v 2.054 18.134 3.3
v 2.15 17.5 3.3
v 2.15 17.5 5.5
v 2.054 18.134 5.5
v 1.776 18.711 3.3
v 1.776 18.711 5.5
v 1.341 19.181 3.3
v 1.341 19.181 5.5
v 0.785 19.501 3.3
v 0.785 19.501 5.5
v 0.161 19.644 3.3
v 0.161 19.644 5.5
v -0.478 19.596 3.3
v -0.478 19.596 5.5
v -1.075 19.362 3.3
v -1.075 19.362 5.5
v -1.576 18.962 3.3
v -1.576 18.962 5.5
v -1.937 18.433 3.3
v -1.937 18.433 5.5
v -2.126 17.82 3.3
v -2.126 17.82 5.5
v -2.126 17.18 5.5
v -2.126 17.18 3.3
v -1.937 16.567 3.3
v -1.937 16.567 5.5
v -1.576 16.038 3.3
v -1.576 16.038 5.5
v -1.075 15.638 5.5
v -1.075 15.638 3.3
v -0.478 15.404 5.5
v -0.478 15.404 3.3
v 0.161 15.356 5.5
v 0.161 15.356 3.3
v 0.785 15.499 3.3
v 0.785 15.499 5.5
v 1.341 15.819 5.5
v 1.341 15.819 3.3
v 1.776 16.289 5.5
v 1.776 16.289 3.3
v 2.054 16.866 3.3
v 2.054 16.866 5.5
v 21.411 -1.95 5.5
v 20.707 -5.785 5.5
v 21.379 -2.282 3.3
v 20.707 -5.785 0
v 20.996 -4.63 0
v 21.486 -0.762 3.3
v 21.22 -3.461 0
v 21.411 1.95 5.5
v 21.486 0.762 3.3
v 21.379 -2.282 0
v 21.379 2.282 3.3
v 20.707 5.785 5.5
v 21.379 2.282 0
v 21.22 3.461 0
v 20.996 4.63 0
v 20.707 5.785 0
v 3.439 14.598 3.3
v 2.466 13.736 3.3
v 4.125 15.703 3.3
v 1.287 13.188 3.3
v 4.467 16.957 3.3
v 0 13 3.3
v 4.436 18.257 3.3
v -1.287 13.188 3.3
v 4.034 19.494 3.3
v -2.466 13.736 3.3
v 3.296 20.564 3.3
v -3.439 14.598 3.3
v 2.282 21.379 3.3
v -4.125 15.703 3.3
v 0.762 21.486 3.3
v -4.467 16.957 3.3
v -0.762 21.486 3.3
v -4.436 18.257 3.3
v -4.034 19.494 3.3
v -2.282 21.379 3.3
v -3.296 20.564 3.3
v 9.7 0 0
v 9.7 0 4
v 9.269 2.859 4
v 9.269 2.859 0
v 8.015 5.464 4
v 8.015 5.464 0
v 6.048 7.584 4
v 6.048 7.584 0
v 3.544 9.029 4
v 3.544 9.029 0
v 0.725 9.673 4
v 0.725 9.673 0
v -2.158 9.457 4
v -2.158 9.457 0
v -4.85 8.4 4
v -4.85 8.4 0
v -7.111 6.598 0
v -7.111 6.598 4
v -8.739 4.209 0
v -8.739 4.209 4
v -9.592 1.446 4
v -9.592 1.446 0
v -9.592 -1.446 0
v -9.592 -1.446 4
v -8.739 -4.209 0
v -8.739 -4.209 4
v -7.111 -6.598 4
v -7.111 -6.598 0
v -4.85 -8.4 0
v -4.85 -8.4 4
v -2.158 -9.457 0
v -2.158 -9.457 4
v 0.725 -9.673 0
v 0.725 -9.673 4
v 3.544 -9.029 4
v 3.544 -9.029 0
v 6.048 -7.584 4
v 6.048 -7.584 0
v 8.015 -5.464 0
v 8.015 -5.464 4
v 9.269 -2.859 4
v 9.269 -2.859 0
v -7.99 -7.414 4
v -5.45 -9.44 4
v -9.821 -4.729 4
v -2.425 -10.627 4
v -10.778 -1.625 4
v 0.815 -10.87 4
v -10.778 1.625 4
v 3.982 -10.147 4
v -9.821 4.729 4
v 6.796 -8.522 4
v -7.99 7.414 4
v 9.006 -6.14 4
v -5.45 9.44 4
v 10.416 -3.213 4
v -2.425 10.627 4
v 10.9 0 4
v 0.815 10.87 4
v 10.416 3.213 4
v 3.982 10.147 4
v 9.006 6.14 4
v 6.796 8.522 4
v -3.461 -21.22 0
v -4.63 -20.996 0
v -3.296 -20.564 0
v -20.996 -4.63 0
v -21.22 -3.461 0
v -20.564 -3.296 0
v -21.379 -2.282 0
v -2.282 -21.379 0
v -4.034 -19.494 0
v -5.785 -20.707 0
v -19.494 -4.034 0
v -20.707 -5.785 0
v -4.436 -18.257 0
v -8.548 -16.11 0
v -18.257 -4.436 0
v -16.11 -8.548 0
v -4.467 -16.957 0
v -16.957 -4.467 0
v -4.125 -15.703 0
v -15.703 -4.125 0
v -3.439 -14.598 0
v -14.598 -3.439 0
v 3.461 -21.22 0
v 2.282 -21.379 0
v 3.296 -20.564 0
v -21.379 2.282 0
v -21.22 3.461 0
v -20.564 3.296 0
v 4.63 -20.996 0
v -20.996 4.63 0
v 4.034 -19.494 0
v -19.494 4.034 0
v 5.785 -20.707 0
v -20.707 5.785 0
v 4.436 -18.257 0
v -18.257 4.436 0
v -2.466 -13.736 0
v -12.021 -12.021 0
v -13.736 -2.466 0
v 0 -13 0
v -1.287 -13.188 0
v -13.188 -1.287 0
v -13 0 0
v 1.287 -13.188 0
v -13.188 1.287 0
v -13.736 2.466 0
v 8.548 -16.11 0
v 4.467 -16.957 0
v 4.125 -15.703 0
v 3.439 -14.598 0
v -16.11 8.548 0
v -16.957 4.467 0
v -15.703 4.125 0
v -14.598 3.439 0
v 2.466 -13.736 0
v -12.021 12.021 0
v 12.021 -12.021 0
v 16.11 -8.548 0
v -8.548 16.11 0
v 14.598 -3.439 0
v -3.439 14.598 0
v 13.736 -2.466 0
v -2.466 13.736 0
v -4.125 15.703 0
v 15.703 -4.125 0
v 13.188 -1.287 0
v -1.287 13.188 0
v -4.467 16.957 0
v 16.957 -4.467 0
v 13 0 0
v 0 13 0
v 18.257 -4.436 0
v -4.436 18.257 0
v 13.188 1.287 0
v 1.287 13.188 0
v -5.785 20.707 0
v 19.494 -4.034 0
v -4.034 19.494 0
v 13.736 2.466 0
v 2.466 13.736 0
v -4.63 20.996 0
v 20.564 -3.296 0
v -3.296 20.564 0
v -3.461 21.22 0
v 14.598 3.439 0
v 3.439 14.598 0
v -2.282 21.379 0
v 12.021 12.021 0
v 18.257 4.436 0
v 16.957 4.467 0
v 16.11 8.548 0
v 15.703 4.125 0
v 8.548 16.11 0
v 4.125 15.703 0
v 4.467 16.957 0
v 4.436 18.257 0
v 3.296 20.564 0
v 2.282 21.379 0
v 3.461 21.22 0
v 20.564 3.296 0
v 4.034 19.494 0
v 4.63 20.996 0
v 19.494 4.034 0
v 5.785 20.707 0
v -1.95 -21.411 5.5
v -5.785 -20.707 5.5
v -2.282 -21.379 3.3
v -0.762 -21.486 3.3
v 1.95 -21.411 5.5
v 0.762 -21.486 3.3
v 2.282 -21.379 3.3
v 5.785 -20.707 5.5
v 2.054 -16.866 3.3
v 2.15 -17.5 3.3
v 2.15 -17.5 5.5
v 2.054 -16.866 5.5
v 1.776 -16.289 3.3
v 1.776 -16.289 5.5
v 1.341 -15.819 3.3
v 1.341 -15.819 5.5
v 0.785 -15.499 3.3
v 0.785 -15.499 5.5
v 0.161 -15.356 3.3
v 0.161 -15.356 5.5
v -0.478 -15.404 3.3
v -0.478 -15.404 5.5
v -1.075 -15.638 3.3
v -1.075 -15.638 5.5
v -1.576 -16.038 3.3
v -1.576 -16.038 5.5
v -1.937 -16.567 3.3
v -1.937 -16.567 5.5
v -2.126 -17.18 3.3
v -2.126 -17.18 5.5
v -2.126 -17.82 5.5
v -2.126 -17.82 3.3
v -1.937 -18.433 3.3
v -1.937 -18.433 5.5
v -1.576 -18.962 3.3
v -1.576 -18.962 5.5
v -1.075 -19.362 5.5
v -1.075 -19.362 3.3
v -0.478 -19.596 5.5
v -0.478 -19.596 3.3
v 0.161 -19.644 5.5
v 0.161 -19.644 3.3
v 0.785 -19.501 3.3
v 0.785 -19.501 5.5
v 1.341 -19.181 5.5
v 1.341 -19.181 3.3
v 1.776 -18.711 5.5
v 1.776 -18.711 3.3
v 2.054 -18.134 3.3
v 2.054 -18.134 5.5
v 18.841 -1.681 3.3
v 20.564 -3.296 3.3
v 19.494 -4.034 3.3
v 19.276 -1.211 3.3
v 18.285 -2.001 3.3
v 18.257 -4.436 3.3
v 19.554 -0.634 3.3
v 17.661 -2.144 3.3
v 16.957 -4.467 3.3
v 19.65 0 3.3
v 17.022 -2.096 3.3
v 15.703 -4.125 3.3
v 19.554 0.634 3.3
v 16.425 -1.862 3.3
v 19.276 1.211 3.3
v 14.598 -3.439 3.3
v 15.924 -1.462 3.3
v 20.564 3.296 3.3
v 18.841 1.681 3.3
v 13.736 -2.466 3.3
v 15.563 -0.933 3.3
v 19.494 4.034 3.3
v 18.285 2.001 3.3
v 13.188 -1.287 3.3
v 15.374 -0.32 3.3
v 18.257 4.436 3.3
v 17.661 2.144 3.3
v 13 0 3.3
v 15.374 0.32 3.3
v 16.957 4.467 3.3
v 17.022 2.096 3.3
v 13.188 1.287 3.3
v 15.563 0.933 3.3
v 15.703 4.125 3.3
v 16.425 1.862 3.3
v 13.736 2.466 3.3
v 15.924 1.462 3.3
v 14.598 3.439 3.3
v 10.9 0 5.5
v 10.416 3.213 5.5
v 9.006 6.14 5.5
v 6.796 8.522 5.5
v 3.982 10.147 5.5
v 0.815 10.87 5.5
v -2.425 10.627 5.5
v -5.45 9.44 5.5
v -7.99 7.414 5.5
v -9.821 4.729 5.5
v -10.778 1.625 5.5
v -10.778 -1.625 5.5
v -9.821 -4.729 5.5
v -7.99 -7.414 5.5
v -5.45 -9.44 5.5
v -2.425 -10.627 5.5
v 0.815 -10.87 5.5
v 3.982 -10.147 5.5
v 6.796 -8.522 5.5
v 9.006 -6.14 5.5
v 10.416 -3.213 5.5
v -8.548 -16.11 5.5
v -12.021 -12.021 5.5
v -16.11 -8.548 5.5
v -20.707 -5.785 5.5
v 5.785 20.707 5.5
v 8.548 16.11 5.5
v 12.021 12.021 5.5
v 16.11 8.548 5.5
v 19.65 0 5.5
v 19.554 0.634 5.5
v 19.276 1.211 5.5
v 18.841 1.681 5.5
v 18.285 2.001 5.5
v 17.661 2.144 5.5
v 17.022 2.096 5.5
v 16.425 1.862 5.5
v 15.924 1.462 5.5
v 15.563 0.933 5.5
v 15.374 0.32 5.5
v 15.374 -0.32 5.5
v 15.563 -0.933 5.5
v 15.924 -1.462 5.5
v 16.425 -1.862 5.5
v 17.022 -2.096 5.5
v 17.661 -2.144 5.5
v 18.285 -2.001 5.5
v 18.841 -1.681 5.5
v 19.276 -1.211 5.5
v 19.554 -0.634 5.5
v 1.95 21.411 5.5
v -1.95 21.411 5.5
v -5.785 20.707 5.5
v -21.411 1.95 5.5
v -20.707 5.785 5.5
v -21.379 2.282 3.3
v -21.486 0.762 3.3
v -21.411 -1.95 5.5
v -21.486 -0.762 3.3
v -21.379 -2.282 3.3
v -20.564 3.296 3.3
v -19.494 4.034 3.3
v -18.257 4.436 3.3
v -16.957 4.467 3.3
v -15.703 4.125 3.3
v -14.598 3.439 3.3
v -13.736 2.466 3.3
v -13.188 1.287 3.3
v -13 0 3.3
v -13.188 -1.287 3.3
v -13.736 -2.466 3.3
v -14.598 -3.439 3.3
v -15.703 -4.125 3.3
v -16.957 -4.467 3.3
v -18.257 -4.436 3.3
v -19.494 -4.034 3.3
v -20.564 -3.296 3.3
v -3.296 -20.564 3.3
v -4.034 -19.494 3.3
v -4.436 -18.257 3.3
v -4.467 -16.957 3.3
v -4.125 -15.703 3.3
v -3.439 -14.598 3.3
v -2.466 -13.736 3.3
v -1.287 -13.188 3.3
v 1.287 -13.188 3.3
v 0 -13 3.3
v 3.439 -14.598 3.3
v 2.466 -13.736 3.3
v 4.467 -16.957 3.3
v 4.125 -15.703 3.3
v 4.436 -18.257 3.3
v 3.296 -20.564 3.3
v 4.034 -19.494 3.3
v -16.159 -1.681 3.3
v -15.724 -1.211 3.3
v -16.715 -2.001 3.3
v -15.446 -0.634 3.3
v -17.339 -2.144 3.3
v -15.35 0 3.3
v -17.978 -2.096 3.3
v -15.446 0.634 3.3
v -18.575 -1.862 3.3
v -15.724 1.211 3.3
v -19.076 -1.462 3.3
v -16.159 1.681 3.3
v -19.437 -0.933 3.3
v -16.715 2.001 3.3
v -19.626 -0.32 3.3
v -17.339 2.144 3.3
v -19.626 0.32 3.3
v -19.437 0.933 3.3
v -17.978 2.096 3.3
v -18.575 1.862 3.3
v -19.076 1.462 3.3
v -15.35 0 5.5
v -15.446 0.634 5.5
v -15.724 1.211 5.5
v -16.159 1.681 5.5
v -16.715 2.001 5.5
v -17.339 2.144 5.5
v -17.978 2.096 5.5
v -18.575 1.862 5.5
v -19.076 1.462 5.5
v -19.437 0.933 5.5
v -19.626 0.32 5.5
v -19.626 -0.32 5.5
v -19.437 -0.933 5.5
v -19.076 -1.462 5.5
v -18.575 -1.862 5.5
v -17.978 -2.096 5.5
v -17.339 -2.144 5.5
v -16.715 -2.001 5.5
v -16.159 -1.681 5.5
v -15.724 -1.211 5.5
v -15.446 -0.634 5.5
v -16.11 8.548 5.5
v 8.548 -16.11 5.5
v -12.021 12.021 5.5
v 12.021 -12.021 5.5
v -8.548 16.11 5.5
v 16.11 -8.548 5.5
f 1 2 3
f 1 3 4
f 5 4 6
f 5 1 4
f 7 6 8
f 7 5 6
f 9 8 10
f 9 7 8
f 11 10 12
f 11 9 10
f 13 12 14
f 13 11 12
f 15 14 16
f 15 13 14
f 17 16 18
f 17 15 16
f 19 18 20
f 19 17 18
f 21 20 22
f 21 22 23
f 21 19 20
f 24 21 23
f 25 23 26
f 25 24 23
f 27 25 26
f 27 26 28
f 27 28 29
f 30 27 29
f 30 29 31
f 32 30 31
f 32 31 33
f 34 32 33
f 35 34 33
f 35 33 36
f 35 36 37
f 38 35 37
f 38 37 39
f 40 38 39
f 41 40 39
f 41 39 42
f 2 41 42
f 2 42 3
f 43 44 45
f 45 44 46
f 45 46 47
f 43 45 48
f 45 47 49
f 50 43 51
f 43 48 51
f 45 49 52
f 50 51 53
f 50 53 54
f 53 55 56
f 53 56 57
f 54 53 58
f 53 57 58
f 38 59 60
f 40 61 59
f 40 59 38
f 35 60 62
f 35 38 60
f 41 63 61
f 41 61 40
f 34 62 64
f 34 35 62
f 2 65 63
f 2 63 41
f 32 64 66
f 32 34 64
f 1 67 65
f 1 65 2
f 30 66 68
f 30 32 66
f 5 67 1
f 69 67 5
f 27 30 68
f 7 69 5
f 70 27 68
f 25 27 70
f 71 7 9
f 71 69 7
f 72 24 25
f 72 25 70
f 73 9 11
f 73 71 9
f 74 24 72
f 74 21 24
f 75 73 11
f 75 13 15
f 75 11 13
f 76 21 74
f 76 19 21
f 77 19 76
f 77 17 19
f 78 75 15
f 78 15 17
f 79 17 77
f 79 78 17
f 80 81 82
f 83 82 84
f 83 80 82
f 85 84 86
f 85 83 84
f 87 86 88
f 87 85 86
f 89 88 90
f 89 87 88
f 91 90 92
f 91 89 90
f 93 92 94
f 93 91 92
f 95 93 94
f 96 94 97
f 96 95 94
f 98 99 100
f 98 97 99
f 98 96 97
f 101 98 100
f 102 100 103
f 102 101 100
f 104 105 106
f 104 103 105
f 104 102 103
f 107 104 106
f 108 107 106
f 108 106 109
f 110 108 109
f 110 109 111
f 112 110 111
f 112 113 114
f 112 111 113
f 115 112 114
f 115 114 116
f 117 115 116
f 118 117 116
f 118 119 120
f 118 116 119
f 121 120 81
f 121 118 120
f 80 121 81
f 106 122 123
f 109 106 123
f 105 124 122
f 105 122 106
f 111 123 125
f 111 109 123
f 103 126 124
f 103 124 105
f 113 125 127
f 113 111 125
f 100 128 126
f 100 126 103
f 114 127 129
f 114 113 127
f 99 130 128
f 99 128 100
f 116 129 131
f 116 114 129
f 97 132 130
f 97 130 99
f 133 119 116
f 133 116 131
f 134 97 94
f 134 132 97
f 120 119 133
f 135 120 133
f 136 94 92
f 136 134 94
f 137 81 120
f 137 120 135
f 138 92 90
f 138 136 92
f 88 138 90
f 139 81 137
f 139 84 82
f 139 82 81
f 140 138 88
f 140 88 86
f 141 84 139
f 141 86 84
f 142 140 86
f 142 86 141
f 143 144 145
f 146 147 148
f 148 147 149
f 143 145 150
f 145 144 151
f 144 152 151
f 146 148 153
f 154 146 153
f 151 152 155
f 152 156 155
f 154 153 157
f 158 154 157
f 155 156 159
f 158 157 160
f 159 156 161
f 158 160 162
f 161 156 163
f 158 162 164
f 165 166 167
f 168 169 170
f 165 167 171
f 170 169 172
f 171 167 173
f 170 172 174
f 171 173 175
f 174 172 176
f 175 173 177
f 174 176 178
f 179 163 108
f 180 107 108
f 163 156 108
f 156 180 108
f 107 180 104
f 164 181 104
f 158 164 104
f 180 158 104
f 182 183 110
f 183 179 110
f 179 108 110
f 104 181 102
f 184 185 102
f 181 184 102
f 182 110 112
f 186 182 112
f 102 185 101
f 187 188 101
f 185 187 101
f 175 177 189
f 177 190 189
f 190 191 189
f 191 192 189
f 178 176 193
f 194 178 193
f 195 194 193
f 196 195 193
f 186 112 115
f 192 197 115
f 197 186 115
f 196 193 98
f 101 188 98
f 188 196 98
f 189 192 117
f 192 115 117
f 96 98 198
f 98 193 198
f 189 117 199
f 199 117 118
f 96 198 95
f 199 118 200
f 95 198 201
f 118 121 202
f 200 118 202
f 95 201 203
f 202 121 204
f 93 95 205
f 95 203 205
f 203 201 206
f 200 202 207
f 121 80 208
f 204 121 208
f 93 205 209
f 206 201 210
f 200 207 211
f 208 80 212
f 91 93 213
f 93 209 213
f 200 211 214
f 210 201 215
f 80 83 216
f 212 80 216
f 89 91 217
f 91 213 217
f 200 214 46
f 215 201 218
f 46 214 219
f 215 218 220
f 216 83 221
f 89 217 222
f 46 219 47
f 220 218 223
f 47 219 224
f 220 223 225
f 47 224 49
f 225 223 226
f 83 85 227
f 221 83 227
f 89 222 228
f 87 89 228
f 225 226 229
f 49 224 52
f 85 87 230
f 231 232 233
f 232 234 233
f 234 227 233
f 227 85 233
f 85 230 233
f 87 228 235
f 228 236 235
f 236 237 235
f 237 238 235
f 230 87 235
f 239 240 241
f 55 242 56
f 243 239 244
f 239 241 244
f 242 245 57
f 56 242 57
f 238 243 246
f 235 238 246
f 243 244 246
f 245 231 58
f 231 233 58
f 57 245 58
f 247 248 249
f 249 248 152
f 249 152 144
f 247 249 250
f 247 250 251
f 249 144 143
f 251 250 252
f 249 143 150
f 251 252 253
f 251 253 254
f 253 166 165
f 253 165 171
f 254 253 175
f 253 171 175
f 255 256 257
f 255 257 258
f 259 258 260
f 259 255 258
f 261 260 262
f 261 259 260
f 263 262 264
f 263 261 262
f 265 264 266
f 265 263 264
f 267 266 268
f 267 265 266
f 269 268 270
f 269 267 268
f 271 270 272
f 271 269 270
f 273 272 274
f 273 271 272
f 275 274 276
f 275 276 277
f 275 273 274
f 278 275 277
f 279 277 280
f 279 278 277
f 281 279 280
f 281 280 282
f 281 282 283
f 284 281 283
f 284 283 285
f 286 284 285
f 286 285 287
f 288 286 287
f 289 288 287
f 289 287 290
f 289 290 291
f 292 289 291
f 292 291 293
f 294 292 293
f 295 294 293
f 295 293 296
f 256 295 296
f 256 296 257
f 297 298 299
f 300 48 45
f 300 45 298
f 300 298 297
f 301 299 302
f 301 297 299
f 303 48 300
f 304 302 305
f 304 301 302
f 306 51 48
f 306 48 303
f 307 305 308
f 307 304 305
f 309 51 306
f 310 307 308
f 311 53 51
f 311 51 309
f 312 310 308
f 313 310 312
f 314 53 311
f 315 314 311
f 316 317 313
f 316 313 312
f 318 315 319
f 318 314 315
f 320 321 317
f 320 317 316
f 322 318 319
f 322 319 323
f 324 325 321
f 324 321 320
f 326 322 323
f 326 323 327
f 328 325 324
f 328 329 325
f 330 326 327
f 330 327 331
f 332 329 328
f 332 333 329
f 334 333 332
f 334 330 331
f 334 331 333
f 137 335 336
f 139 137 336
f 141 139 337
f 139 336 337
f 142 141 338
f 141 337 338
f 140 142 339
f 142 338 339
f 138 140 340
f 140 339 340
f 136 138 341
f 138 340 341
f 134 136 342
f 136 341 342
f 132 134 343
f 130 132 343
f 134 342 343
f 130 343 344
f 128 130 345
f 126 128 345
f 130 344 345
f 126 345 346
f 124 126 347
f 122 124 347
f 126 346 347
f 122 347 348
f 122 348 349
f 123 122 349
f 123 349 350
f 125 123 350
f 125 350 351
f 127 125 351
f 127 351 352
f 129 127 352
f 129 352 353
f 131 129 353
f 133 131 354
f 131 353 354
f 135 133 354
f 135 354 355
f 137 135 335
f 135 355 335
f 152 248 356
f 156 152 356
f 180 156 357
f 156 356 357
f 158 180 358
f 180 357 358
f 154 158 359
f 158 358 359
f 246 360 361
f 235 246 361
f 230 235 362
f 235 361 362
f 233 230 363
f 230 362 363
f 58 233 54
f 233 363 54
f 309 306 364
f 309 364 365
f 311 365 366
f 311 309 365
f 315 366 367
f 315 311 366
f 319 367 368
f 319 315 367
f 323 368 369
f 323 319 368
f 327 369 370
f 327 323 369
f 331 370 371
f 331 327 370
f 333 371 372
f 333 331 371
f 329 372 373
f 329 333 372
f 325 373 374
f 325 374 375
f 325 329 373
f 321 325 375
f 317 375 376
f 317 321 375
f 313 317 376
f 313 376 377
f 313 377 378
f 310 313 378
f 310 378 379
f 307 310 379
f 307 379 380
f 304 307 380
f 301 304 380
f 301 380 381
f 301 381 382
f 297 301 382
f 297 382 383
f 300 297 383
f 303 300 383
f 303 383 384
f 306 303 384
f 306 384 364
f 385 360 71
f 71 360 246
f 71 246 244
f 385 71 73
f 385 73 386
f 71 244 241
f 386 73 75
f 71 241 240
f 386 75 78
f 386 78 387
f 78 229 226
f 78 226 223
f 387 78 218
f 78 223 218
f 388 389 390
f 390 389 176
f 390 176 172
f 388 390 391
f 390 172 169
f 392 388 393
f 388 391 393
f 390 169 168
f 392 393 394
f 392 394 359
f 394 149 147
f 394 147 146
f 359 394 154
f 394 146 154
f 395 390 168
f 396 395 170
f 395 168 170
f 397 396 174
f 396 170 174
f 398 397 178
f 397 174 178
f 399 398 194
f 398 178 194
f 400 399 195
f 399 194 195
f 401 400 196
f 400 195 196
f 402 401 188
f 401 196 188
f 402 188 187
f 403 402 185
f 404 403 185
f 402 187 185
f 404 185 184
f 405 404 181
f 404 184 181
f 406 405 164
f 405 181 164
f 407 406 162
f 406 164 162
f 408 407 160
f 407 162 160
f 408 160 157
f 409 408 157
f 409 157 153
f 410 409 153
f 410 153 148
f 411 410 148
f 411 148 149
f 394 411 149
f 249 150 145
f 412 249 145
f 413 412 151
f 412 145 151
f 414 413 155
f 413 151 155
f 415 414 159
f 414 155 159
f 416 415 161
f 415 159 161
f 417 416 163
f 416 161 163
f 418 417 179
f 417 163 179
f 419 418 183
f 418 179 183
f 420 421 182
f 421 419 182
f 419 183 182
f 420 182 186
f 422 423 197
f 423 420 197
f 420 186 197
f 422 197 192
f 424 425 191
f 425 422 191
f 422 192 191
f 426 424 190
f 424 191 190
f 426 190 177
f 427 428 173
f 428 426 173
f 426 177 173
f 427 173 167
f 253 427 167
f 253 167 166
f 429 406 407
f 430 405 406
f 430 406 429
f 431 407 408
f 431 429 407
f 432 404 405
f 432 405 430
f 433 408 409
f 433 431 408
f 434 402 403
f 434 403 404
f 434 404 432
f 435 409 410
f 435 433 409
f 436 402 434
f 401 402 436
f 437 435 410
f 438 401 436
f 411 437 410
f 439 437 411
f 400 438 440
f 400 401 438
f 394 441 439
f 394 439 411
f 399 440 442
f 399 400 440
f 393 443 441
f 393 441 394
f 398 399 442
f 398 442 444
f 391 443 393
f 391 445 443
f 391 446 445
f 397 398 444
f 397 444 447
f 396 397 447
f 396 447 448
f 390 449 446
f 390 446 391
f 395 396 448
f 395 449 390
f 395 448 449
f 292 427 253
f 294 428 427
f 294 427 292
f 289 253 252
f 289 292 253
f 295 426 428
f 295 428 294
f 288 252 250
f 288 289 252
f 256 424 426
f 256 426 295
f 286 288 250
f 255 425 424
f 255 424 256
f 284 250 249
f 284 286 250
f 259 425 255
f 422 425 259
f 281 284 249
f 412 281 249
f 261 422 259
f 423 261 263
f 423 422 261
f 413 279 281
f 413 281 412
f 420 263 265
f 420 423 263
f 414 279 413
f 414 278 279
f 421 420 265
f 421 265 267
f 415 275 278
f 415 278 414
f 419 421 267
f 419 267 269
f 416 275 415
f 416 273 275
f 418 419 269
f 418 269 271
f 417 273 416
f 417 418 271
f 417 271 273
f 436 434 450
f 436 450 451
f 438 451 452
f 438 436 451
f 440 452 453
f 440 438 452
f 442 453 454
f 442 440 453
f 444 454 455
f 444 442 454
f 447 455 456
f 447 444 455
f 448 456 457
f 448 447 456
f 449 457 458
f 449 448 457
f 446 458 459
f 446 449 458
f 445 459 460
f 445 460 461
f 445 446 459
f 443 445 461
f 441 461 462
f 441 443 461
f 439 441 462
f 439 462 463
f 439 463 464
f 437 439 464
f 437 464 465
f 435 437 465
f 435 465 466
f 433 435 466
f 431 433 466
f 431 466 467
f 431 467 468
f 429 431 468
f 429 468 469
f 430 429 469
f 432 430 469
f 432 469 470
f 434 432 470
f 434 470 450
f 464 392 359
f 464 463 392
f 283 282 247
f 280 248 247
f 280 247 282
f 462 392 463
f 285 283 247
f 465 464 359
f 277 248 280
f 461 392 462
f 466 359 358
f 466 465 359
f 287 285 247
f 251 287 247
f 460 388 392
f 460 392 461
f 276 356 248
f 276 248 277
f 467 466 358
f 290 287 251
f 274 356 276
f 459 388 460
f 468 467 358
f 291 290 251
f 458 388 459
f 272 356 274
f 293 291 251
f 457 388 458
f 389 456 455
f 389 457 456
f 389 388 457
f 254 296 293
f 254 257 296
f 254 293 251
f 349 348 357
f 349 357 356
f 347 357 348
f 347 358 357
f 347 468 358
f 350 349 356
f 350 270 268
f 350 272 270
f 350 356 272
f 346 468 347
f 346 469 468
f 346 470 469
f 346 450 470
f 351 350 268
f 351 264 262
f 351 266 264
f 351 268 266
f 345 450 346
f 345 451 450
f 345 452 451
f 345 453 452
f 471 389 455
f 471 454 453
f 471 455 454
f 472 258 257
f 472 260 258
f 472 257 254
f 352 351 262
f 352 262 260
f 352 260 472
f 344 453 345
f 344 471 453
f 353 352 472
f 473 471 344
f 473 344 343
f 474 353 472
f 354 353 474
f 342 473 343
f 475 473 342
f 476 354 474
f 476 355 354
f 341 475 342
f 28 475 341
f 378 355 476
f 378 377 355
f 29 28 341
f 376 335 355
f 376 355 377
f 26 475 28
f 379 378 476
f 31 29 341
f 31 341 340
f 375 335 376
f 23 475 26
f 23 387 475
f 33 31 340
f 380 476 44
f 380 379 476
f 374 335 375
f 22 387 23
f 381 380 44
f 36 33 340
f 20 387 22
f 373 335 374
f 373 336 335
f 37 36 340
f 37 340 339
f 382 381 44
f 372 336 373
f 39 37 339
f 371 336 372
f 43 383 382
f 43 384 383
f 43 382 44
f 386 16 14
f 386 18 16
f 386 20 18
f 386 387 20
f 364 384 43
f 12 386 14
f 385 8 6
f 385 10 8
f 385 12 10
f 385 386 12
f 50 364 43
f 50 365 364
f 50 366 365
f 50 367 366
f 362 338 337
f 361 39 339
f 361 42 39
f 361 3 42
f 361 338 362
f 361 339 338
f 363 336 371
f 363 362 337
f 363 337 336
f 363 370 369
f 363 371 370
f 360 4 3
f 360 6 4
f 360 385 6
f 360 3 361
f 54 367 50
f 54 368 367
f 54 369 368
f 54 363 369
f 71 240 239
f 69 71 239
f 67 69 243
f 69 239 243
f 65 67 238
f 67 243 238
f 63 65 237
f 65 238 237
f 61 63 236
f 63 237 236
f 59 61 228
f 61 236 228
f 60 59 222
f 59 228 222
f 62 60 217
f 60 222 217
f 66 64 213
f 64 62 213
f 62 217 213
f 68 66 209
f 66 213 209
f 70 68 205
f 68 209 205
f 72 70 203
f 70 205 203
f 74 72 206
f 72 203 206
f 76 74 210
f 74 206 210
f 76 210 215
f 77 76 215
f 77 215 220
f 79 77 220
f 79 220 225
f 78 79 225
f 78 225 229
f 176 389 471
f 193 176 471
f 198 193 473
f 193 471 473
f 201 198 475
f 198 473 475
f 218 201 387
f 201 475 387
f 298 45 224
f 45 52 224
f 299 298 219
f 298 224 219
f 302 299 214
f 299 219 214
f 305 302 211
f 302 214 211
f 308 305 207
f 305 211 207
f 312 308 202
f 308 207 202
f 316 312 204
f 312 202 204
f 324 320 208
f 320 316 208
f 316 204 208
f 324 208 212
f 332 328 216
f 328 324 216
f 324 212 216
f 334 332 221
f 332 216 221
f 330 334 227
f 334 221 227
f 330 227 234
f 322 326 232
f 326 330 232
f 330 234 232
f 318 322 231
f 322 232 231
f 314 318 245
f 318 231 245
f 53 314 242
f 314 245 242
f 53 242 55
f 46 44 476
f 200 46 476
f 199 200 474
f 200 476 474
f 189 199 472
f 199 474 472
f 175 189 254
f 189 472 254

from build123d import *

# Parameters (mm, degrees)
SKETCH_1_R          = 21.5
SKETCH_1_R_2        = 2.15
SKETCH_1_R_3        = 9.7
EXTRUDE_1_DEPTH     = 5.5
SKETCH_2_R          = 10.9
SKETCH_2_R_2        = 9.55
CUT_EXTRUDE_1_DEPTH = 1.5
CUT_EXTRUDE_2_DEPTH = 31.899029111
SKETCH_4_R          = 4.5
CUT_EXTRUDE_3_DEPTH = 3.3


with BuildPart() as part:
    # 草图1 → 凸台-拉伸1 (new body)
    with BuildSketch(Plane.XY):
        Circle(SKETCH_1_R)
        with Locations((0, 17.5)):
            Circle(SKETCH_1_R_2, mode=Mode.SUBTRACT)
        with Locations((17.5, 0)):
            Circle(SKETCH_1_R_2, mode=Mode.SUBTRACT)
        with Locations((-17.5, 0)):
            Circle(SKETCH_1_R_2, mode=Mode.SUBTRACT)
        with Locations((0, -17.5)):
            Circle(SKETCH_1_R_2, mode=Mode.SUBTRACT)
        Circle(SKETCH_1_R_3, mode=Mode.SUBTRACT)
    extrude(amount=EXTRUDE_1_DEPTH)

    # 草图2 → 切除-拉伸1 (cut)
    with BuildSketch(Plane.XY.offset(5.5)):
        Circle(SKETCH_2_R)
        Circle(SKETCH_2_R_2, mode=Mode.SUBTRACT)
    extrude(amount=-CUT_EXTRUDE_1_DEPTH, mode=Mode.SUBTRACT)

    # 草图3 → 切除-拉伸2 (cut, through all)
    with BuildSketch(Plane.XY.offset(5.5)):
        with BuildLine():
            ThreePointArc((5.784529249, 20.707226308), (12.02081528, 12.02081528), (20.707226308, 5.784529249))
            ThreePointArc((20.707226308, 5.784529249), (15.202795796, 15.202795796), (5.784529249, 20.707226308))
        make_face()
        with BuildLine():
            ThreePointArc((-20.707226308, 5.784529249), (-12.02081528, 12.02081528), (-5.784529249, 20.707226308))
            ThreePointArc((-5.784529249, 20.707226308), (-15.202795796, 15.202795796), (-20.707226308, 5.784529249))
        make_face()
        with BuildLine():
            ThreePointArc((-5.784529249, -20.707226308), (-12.02081528, -12.02081528), (-20.707226308, -5.784529249))
            ThreePointArc((-20.707226308, -5.784529249), (-15.202795796, -15.202795796), (-5.784529249, -20.707226308))
        make_face()
        with BuildLine():
            ThreePointArc((20.707226308, -5.784529249), (12.02081528, -12.02081528), (5.784529249, -20.707226308))
            ThreePointArc((5.784529249, -20.707226308), (15.202795796, -15.202795796), (20.707226308, -5.784529249))
        make_face()
    extrude(amount=-CUT_EXTRUDE_2_DEPTH, mode=Mode.SUBTRACT)

    # 草图4 → 切除-拉伸3 (cut)
    with BuildSketch(Plane(origin=(0, 0, 0), x_dir=(-1, 0, 0), z_dir=(0, 0, -1))):
        with Locations((0, 17.5)):
            Circle(SKETCH_4_R)
        with Locations((17.5, 0)):
            Circle(SKETCH_4_R)
        with Locations((-17.5, 0)):
            Circle(SKETCH_4_R)
        with Locations((0, -17.5)):
            Circle(SKETCH_4_R)
    extrude(amount=-CUT_EXTRUDE_3_DEPTH, mode=Mode.SUBTRACT)


solid = part.part
